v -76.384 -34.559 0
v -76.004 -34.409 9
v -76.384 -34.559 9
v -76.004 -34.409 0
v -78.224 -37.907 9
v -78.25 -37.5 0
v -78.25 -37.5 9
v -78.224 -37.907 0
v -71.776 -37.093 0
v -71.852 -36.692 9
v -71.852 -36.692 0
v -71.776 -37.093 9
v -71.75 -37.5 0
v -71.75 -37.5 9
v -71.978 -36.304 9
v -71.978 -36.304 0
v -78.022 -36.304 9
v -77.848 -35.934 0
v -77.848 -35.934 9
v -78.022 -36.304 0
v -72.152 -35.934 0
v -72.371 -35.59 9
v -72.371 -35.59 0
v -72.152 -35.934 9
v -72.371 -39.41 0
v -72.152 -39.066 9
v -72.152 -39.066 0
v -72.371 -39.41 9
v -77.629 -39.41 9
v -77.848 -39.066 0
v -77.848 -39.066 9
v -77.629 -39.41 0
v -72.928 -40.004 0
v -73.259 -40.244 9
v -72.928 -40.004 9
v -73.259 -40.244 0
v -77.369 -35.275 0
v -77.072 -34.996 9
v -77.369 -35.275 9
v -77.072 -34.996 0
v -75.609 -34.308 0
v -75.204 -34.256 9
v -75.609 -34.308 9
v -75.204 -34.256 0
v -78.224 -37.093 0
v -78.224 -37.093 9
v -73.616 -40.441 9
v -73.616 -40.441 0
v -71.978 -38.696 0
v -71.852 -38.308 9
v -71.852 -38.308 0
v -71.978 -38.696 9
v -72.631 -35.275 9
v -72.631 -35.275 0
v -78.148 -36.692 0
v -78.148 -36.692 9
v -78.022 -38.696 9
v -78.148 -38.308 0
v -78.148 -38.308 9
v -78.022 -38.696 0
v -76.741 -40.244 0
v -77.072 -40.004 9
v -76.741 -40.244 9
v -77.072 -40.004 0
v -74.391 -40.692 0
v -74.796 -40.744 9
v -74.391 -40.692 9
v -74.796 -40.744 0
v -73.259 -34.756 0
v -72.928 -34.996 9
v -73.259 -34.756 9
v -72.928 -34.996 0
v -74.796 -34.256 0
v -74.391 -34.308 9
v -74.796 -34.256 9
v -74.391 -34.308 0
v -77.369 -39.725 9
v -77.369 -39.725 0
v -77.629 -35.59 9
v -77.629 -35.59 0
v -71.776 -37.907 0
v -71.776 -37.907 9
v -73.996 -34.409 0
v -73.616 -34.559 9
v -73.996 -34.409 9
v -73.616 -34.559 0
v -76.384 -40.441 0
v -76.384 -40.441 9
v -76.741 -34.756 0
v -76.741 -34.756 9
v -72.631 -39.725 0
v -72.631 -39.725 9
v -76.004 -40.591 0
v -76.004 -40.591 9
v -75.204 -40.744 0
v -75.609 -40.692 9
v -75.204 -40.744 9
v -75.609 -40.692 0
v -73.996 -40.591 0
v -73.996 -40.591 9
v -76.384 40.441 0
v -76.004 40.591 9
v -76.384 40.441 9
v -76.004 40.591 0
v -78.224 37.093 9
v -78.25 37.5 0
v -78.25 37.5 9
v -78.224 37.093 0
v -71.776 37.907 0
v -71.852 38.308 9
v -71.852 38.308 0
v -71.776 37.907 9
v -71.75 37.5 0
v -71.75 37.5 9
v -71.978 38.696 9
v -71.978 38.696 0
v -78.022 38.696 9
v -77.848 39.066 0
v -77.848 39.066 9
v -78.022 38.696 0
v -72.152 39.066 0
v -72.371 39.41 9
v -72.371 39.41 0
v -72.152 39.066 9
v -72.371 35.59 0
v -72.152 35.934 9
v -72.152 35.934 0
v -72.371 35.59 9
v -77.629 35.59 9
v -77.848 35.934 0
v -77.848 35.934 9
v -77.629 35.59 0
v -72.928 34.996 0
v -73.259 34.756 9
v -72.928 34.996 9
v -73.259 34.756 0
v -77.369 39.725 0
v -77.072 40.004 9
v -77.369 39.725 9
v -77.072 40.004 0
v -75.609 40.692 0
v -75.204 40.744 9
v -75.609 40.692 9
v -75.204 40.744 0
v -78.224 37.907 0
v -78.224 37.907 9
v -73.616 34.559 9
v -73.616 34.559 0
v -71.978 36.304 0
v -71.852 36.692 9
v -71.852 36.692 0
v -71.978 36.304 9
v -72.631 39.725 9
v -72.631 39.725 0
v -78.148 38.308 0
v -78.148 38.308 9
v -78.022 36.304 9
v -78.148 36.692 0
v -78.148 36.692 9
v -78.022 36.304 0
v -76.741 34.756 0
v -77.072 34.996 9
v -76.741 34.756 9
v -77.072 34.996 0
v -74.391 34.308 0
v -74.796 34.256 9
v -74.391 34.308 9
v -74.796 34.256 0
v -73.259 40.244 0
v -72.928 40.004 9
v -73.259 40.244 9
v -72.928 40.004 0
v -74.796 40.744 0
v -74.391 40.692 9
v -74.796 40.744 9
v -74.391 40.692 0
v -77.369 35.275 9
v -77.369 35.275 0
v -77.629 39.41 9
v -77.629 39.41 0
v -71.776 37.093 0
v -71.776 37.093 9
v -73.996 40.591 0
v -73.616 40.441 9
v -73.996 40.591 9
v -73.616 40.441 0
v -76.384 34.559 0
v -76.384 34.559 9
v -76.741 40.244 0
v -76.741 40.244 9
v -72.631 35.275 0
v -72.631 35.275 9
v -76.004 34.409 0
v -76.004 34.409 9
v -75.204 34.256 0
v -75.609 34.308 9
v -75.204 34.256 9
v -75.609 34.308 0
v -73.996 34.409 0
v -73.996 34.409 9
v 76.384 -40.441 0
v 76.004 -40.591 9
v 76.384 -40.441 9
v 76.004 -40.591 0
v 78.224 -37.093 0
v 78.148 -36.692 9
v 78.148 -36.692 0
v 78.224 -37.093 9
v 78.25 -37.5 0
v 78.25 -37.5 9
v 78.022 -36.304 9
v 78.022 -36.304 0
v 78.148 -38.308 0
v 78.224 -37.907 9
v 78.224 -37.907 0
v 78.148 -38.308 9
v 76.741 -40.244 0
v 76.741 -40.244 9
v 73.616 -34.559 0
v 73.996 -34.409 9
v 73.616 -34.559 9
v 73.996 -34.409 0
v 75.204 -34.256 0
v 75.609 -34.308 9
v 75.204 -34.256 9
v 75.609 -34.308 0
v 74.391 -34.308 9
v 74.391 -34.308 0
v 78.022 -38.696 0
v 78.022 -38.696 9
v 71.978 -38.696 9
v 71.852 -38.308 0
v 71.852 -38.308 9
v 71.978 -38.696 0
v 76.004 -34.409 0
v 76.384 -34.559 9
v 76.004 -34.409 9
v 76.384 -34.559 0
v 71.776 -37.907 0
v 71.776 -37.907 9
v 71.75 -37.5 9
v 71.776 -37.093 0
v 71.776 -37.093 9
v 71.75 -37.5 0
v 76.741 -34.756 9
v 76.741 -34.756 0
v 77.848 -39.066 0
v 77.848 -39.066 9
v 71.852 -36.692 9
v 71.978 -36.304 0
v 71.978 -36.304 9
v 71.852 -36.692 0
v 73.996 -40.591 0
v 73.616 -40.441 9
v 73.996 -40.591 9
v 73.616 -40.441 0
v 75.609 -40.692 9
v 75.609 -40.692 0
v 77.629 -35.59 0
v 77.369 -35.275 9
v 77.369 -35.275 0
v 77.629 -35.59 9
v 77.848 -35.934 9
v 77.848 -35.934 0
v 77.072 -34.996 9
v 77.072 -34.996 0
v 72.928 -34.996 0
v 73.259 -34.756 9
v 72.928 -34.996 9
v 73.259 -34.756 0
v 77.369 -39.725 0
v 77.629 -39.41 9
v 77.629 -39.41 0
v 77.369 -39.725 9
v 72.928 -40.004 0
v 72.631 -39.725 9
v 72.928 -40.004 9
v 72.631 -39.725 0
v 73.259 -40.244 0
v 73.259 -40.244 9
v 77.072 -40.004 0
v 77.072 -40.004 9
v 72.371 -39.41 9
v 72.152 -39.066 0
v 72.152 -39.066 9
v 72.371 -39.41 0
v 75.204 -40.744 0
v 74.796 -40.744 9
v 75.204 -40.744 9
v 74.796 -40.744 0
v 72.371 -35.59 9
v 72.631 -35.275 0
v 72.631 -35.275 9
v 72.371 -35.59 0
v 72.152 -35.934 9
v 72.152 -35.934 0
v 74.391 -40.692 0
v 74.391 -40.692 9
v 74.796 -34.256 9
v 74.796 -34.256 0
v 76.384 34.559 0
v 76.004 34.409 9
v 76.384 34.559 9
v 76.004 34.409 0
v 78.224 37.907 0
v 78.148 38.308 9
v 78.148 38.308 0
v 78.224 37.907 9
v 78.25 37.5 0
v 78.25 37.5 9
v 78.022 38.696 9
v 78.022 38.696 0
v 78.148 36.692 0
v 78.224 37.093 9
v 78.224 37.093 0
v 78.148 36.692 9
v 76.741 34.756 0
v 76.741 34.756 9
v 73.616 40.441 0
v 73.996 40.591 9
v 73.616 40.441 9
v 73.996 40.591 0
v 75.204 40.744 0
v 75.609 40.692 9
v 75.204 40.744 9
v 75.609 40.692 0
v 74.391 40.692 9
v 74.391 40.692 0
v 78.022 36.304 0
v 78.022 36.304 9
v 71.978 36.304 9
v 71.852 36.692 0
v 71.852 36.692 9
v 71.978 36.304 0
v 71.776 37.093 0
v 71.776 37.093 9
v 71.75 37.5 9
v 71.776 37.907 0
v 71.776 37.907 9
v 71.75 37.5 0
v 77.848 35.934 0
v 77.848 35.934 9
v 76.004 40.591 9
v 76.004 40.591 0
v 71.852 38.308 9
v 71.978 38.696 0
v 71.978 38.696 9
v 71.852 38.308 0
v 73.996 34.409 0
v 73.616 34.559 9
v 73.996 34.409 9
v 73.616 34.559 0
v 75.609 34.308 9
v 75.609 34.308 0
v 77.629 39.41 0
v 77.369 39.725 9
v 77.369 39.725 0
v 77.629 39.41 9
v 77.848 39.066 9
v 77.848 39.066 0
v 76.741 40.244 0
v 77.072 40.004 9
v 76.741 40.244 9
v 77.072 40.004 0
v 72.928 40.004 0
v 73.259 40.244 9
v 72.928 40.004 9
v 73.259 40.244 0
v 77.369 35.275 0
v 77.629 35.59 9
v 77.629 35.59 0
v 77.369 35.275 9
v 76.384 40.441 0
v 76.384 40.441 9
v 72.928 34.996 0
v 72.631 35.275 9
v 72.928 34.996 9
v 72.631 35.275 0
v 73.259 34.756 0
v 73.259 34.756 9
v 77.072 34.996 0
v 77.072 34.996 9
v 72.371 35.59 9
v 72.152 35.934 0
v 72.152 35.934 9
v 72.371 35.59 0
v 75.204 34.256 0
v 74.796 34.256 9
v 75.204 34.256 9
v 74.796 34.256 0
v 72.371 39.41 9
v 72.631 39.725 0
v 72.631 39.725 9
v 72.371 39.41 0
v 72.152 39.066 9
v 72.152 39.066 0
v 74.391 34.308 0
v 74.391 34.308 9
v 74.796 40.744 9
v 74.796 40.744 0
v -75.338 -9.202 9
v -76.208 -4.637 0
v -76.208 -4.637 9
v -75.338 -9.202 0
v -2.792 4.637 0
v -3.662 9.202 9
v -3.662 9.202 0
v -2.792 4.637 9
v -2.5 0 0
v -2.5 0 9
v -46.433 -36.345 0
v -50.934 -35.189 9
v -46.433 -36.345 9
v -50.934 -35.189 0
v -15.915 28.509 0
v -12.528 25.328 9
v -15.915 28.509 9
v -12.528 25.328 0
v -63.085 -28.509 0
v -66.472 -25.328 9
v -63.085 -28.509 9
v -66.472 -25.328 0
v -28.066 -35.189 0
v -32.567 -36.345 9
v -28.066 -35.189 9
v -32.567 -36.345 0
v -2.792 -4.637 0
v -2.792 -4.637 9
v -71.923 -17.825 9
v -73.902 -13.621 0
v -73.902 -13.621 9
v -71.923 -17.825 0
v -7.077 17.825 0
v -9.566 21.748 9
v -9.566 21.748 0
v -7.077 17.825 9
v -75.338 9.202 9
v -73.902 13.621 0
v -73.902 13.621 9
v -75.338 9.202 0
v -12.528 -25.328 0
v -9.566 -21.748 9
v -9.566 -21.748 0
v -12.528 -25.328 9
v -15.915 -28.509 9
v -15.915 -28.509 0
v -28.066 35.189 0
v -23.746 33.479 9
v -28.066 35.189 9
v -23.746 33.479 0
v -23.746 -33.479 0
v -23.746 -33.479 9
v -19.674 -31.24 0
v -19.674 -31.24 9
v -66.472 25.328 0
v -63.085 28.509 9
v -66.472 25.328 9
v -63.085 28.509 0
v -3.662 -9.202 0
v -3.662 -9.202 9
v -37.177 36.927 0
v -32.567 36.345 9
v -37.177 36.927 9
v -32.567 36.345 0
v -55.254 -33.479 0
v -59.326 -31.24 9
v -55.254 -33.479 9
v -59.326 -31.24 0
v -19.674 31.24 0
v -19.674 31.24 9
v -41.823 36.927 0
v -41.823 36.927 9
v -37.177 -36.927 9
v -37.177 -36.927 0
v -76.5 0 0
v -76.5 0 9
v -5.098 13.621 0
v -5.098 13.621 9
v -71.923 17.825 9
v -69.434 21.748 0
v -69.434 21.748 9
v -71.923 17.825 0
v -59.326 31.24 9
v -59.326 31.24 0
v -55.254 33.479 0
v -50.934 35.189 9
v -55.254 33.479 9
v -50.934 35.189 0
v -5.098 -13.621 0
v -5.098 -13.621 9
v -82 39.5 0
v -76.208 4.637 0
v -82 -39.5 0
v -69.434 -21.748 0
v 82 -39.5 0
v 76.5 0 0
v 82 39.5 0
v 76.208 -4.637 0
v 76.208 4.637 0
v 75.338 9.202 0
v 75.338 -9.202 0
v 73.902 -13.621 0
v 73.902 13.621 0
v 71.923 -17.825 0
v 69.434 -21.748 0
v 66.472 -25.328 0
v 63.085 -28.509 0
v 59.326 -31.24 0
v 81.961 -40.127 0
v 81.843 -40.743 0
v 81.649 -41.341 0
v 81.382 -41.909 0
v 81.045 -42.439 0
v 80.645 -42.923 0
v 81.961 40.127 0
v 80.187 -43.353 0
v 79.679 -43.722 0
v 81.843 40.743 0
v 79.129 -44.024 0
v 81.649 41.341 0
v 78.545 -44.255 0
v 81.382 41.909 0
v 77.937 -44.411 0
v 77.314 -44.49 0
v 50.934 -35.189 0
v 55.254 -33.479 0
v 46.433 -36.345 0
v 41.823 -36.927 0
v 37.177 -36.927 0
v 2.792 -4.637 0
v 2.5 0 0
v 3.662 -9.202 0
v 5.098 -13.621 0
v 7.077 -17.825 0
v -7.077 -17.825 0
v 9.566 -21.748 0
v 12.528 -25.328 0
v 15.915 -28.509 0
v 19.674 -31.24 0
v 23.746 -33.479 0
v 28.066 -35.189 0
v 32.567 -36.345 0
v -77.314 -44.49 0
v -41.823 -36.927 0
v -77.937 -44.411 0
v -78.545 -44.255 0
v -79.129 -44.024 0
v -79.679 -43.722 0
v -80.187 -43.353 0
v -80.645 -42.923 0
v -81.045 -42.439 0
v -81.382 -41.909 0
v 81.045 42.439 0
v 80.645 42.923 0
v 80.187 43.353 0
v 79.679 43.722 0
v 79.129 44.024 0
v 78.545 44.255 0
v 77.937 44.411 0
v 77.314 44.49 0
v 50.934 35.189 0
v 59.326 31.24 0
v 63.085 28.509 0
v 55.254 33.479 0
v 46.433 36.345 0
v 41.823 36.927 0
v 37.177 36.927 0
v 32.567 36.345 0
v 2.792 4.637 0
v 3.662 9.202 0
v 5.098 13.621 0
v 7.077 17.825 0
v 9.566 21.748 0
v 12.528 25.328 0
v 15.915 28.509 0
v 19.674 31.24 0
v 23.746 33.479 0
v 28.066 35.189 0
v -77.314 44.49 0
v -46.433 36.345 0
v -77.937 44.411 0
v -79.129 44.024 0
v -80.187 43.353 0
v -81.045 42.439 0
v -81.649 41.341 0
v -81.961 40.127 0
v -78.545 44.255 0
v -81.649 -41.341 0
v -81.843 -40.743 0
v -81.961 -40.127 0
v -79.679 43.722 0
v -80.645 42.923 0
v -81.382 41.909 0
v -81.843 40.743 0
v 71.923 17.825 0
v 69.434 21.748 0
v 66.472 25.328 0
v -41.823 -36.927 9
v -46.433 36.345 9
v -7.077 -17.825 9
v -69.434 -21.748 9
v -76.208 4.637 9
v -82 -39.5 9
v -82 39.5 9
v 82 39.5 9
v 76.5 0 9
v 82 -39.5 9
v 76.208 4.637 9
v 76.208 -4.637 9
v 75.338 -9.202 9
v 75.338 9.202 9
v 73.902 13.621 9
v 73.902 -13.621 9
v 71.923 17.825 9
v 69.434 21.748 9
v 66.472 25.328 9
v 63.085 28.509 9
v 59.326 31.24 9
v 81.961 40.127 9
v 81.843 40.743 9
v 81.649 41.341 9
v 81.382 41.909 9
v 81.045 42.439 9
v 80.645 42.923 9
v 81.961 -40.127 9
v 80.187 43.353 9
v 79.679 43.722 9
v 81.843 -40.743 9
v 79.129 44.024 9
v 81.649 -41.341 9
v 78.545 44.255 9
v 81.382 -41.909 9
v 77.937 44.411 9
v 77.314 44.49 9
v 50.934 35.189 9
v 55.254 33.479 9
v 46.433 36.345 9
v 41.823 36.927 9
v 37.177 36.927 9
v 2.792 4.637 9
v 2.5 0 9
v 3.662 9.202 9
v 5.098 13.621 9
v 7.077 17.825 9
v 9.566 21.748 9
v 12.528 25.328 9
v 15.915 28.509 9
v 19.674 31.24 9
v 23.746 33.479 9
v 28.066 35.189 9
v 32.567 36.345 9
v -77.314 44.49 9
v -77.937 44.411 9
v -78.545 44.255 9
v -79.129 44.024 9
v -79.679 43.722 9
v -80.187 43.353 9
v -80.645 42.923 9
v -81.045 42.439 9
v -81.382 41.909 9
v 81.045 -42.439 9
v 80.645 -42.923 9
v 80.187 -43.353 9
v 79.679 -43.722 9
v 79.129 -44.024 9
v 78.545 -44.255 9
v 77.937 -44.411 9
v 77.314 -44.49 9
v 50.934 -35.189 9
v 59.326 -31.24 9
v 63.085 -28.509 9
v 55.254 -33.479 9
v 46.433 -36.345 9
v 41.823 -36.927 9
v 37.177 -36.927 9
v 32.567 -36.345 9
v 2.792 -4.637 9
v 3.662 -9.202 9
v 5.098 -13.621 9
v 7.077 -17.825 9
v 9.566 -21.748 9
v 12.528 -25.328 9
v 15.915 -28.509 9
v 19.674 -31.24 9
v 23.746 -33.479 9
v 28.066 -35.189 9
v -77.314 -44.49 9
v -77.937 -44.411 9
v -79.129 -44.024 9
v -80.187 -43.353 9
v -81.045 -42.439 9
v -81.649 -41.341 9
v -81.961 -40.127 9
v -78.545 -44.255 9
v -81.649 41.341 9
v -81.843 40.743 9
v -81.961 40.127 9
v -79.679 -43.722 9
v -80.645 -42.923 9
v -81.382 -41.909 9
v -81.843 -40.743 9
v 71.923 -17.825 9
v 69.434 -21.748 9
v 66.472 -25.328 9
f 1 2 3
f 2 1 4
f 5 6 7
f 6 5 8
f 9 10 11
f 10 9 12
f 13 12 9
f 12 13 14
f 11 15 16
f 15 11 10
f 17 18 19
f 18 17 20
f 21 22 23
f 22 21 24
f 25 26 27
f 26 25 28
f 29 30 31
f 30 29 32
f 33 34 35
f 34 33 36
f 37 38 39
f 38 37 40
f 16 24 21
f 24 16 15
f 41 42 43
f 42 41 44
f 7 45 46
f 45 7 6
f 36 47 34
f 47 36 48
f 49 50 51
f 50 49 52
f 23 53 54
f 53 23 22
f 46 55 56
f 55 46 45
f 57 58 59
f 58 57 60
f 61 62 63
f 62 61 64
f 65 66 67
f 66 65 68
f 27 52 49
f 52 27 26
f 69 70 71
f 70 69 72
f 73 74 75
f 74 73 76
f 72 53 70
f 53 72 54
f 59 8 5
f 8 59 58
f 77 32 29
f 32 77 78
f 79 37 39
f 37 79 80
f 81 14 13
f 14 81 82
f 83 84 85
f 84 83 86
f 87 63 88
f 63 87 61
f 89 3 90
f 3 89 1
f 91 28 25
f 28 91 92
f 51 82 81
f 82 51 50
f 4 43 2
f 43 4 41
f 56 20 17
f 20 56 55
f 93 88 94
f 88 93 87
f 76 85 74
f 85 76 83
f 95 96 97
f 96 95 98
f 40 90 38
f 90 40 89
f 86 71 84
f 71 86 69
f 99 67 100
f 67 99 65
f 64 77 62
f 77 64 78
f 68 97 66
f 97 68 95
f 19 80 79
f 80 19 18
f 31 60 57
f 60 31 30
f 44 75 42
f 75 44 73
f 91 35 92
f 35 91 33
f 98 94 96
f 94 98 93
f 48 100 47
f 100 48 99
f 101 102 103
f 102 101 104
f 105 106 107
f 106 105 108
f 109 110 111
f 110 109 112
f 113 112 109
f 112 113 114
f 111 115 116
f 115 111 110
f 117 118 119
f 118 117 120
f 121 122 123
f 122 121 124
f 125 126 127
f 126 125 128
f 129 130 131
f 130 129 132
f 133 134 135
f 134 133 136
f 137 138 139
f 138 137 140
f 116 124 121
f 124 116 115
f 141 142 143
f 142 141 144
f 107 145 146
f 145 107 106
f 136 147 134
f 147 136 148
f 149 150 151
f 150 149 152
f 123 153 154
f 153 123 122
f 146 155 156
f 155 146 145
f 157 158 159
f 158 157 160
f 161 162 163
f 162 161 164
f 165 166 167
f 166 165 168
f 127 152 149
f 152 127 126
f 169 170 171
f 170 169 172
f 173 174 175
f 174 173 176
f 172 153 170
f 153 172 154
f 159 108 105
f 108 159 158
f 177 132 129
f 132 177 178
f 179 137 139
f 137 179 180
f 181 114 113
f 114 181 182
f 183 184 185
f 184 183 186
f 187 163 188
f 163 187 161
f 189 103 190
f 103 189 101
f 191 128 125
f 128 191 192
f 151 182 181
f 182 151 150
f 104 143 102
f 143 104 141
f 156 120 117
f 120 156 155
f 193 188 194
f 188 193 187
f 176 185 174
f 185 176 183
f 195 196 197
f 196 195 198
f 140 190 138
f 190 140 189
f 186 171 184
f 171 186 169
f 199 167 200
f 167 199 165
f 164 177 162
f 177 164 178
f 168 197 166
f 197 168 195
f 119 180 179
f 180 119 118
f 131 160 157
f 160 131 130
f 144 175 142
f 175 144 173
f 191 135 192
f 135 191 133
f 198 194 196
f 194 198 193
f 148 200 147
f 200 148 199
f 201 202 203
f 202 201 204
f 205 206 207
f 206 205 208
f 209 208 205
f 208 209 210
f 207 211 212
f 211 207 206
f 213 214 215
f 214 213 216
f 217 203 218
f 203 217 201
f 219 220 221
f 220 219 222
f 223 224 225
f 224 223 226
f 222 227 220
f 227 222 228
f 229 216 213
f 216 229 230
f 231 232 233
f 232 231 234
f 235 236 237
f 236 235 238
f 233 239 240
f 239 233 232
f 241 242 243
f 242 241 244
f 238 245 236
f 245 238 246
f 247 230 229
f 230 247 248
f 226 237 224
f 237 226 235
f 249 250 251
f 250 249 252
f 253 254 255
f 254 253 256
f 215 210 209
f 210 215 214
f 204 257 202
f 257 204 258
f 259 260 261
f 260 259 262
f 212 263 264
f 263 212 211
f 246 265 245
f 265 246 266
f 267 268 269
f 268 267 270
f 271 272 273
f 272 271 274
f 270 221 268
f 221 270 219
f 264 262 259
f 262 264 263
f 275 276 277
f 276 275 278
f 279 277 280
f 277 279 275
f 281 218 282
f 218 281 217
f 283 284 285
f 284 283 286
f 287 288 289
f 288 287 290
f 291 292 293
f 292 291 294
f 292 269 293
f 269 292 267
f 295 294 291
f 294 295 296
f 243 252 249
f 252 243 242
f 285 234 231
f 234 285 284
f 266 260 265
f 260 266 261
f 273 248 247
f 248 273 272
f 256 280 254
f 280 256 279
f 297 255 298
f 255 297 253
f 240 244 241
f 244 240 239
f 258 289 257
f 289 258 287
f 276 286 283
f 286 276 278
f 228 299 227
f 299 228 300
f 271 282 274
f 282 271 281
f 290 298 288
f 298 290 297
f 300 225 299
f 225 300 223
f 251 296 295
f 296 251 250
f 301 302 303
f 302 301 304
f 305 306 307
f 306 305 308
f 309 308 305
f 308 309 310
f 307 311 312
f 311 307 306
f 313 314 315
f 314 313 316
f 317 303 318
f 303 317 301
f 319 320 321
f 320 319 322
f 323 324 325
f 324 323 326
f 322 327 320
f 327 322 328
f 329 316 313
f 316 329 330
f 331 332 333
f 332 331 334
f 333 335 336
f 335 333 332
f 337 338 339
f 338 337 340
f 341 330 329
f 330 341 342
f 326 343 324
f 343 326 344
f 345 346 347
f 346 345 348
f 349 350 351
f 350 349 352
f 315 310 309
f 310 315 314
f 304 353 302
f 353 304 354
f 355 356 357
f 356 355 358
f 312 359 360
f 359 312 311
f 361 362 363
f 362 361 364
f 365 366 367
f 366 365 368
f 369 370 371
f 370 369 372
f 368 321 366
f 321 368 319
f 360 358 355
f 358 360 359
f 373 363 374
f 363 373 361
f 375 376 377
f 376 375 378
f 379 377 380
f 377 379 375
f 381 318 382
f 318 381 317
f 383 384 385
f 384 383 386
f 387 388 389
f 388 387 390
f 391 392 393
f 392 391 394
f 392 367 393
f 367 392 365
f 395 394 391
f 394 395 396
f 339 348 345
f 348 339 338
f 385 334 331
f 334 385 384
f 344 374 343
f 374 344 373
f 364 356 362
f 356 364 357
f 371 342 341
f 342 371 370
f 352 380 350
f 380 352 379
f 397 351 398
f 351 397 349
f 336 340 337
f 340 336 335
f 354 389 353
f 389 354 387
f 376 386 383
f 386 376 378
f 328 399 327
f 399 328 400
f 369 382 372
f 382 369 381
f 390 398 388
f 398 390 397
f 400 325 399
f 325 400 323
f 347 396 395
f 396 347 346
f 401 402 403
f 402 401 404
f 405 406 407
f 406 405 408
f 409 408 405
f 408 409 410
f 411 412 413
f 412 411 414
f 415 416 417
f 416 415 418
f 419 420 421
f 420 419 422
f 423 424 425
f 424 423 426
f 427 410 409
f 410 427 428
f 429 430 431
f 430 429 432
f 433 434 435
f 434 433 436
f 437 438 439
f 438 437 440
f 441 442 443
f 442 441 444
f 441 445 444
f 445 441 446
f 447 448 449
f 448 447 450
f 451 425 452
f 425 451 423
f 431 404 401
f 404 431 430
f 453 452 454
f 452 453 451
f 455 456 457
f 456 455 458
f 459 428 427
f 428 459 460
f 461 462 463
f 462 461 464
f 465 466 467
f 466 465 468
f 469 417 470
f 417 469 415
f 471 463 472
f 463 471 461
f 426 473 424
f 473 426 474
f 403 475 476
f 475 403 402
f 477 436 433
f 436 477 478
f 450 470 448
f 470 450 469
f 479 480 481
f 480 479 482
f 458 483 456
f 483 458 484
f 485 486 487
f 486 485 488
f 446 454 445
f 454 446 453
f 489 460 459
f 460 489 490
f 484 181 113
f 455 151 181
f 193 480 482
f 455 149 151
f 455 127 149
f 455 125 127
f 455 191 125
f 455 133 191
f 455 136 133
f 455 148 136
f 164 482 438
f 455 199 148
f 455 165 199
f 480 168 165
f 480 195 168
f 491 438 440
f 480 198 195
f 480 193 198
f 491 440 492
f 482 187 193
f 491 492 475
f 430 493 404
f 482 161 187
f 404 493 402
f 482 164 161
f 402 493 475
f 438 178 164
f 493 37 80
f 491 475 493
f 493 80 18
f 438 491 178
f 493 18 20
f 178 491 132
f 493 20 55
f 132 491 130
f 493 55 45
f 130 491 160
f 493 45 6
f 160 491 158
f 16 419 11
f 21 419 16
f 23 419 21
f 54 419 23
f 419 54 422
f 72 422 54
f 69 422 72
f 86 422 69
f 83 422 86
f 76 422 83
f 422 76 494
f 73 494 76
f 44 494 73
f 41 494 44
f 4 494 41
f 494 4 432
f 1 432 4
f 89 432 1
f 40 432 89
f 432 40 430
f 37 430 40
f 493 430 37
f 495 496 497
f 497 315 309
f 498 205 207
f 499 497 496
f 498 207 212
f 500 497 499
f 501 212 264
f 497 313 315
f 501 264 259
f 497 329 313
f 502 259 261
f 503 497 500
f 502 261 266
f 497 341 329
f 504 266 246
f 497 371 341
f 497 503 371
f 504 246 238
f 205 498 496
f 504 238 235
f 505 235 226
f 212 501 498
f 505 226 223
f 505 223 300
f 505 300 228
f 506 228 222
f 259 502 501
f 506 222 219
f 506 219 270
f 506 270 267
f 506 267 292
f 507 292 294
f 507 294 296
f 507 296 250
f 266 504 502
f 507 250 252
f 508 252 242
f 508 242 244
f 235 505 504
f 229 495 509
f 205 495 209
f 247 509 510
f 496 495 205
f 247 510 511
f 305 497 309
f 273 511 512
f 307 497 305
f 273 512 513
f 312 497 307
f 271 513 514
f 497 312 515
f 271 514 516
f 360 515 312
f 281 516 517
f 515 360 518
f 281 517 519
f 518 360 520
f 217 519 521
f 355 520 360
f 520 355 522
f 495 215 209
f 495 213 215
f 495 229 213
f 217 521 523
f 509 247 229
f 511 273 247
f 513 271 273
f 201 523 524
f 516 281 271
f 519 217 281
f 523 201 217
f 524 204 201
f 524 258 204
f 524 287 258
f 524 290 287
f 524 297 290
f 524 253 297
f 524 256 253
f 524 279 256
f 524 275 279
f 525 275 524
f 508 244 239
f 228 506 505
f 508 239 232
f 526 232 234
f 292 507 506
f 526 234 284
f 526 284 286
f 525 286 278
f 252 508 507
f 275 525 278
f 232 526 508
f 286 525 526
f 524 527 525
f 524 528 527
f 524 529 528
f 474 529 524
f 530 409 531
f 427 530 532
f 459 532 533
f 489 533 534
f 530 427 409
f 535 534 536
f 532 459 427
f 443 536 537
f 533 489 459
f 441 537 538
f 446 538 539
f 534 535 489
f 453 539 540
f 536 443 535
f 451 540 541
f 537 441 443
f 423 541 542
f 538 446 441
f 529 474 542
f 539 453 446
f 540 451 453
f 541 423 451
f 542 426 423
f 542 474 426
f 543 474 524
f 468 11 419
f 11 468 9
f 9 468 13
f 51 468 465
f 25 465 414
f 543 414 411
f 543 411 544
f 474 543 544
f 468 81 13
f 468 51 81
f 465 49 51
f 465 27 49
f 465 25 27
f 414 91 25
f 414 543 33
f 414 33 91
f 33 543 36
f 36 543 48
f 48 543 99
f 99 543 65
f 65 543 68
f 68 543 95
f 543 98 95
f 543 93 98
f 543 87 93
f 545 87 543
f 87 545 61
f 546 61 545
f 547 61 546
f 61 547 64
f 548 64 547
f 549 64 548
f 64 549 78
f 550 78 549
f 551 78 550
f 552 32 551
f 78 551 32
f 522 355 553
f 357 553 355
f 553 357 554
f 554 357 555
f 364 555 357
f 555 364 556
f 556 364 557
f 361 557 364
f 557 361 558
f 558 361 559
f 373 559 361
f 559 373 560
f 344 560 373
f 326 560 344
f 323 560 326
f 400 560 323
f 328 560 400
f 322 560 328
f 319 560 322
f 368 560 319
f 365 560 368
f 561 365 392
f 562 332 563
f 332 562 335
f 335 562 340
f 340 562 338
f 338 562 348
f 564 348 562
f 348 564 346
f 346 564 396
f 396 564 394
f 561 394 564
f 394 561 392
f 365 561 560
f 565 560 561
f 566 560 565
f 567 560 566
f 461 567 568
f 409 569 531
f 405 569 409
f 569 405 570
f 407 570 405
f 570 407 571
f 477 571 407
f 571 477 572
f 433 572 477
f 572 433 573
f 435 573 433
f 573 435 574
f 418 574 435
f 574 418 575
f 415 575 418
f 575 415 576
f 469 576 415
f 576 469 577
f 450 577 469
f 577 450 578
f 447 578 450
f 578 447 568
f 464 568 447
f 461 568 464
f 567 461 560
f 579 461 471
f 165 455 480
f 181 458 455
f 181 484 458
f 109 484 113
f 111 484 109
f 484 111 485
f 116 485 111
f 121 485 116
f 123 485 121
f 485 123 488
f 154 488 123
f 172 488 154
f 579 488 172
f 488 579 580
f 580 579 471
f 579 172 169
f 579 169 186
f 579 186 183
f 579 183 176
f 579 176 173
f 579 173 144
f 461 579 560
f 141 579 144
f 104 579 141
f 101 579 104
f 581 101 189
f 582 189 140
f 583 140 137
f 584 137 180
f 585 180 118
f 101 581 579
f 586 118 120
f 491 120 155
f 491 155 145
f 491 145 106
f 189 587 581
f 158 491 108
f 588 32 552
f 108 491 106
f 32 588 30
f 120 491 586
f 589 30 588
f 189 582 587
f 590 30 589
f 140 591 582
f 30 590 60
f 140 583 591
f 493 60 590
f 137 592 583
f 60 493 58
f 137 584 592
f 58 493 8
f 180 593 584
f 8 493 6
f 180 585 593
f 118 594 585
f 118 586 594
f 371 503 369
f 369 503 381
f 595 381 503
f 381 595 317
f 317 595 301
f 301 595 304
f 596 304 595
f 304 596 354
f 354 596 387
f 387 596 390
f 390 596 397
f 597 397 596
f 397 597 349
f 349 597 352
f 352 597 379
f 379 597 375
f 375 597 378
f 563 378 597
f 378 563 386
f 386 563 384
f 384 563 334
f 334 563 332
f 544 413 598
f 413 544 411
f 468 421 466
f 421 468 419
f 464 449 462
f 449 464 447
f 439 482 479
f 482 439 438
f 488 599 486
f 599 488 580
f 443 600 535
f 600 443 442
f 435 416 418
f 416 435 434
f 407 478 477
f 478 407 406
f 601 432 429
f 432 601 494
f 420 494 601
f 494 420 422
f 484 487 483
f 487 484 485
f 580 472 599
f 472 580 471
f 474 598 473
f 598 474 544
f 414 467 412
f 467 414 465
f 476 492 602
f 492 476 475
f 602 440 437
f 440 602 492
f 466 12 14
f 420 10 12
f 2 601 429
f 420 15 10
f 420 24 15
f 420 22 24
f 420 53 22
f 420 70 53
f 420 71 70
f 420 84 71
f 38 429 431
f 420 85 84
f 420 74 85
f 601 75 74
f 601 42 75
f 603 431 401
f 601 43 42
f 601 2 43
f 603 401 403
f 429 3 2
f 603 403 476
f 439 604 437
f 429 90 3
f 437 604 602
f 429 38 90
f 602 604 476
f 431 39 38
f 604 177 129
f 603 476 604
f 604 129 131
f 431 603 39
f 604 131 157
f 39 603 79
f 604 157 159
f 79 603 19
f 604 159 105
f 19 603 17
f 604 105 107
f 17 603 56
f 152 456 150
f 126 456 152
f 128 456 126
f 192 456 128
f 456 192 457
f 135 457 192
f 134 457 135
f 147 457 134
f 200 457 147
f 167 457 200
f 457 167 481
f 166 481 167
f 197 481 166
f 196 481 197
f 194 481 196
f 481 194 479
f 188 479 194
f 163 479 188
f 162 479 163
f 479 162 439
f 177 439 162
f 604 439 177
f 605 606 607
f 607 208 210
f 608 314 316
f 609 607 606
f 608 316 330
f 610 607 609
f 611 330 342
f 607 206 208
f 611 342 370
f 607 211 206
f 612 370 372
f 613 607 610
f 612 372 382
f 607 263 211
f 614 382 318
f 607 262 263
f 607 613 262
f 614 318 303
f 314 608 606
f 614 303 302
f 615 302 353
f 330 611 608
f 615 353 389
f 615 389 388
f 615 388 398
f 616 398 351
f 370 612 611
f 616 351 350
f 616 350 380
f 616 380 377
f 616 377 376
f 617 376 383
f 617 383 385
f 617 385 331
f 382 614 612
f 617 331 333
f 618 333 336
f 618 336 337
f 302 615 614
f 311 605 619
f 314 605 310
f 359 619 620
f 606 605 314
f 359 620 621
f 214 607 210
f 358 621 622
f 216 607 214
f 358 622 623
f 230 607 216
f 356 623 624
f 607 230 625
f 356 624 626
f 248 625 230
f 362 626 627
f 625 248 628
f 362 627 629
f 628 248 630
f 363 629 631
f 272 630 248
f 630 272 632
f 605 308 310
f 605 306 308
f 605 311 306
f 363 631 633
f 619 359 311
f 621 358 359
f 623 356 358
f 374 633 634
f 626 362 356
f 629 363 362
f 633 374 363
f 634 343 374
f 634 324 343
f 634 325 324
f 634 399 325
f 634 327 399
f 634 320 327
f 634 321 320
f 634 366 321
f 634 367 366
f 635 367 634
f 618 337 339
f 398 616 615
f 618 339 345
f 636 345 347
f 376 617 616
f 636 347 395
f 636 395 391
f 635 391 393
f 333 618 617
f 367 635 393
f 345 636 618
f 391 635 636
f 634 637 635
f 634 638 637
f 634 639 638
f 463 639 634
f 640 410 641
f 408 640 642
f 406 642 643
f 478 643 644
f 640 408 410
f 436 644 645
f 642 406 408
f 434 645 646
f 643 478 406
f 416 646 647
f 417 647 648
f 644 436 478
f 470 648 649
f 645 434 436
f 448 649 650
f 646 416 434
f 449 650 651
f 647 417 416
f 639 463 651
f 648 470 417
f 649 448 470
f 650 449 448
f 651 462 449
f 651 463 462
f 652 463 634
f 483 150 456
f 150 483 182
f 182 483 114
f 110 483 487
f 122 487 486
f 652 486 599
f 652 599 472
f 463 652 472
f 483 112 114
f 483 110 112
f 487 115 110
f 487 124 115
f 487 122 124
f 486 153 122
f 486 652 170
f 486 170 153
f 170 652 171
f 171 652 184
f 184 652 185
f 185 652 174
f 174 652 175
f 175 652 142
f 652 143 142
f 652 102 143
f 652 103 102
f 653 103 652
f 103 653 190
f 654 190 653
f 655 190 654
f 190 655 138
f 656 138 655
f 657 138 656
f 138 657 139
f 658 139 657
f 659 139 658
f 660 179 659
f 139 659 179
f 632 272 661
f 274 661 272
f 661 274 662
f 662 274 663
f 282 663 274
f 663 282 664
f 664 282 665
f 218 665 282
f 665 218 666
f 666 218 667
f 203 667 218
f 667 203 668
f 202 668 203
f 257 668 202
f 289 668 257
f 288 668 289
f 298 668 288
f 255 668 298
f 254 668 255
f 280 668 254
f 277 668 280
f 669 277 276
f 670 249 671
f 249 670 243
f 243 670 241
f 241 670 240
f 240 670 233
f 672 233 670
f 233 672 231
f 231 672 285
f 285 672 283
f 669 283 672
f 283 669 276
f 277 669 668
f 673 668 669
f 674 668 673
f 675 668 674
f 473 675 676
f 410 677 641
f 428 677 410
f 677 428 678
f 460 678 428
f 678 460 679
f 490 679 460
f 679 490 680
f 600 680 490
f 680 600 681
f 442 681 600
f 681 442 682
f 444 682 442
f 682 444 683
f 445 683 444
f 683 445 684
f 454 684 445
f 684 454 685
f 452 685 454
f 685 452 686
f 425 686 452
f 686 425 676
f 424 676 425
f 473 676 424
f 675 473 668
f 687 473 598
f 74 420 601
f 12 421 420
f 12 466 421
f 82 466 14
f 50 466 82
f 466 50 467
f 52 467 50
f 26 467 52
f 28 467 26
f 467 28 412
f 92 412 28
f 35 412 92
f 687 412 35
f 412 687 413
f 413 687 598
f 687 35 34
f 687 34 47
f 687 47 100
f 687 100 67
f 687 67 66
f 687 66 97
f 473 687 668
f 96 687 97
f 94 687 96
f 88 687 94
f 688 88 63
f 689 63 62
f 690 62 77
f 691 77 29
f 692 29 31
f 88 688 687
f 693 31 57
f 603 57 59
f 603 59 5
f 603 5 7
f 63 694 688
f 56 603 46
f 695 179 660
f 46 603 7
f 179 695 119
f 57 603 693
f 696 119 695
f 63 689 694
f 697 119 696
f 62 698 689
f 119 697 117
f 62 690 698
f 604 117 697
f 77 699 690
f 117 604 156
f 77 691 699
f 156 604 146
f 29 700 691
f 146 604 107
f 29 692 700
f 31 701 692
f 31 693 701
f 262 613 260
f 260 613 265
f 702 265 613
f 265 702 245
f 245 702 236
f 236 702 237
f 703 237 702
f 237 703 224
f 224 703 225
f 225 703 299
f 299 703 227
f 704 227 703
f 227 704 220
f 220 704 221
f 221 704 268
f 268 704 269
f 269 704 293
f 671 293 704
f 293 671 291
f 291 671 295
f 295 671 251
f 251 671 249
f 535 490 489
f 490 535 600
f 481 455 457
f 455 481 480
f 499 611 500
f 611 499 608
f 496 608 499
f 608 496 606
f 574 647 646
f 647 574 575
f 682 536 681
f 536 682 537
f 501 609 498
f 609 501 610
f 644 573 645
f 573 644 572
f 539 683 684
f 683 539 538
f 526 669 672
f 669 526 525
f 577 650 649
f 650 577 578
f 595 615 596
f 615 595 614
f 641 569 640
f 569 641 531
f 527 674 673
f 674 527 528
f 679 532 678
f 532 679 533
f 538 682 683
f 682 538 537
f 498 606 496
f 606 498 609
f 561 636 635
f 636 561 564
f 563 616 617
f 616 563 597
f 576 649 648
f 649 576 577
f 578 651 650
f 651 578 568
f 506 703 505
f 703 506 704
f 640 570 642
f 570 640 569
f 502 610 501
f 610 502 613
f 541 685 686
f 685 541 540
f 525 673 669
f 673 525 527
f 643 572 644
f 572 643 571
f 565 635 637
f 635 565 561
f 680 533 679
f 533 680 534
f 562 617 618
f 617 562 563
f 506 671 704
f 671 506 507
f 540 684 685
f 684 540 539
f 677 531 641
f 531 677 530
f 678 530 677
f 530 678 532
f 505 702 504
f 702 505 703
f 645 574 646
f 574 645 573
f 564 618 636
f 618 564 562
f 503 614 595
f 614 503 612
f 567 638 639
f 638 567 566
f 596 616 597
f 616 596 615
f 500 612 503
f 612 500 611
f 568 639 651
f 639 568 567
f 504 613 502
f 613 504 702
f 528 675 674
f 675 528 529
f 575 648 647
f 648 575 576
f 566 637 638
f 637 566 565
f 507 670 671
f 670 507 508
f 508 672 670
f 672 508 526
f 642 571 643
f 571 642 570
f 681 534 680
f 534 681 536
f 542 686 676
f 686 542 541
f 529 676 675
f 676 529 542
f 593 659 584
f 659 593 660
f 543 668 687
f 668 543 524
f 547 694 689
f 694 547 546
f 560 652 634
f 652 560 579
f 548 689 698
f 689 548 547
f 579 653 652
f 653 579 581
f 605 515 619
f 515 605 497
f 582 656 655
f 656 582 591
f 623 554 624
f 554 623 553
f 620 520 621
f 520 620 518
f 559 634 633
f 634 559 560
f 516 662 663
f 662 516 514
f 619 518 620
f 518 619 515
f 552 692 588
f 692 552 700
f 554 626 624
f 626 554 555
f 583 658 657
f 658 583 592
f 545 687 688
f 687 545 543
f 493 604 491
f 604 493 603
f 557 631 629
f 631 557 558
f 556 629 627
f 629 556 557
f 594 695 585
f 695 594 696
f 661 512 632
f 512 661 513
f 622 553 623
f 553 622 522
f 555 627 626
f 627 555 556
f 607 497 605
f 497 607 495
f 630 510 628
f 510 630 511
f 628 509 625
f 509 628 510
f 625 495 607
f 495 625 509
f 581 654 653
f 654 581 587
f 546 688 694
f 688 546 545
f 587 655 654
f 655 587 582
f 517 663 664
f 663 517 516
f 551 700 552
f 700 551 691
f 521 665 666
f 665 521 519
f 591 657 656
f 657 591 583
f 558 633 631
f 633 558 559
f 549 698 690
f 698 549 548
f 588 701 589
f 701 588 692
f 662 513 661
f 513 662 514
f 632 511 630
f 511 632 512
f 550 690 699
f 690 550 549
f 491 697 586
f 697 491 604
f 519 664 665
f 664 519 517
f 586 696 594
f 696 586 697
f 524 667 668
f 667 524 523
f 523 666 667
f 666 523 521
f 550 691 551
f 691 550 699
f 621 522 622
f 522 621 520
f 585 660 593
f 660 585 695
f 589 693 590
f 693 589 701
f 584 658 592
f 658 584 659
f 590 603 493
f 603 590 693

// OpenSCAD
$fn = 50;


difference() {
	union() {
		hull() {
			translate(v = [-77.0000000000, 39.5000000000, 0]) {
				cylinder(h = 9, r = 5);
			}
			translate(v = [77.0000000000, 39.5000000000, 0]) {
				cylinder(h = 9, r = 5);
			}
			translate(v = [-77.0000000000, -39.5000000000, 0]) {
				cylinder(h = 9, r = 5);
			}
			translate(v = [77.0000000000, -39.5000000000, 0]) {
				cylinder(h = 9, r = 5);
			}
		}
	}
	union() {
		#translate(v = [-75.0000000000, -37.5000000000, -100.0000000000]) {
			cylinder(h = 200, r = 3.2500000000);
		}
		#translate(v = [-75.0000000000, 37.5000000000, -100.0000000000]) {
			cylinder(h = 200, r = 3.2500000000);
		}
		#translate(v = [75.0000000000, -37.5000000000, -100.0000000000]) {
			cylinder(h = 200, r = 3.2500000000);
		}
		#translate(v = [75.0000000000, 37.5000000000, -100.0000000000]) {
			cylinder(h = 200, r = 3.2500000000);
		}
		#translate(v = [-39.5000000000, 0, 0]) {
			cylinder(h = 9, r = 37.0000000000);
		}
		#translate(v = [39.5000000000, 0, 0]) {
			cylinder(h = 9, r = 37.0000000000);
		}
	}
}
